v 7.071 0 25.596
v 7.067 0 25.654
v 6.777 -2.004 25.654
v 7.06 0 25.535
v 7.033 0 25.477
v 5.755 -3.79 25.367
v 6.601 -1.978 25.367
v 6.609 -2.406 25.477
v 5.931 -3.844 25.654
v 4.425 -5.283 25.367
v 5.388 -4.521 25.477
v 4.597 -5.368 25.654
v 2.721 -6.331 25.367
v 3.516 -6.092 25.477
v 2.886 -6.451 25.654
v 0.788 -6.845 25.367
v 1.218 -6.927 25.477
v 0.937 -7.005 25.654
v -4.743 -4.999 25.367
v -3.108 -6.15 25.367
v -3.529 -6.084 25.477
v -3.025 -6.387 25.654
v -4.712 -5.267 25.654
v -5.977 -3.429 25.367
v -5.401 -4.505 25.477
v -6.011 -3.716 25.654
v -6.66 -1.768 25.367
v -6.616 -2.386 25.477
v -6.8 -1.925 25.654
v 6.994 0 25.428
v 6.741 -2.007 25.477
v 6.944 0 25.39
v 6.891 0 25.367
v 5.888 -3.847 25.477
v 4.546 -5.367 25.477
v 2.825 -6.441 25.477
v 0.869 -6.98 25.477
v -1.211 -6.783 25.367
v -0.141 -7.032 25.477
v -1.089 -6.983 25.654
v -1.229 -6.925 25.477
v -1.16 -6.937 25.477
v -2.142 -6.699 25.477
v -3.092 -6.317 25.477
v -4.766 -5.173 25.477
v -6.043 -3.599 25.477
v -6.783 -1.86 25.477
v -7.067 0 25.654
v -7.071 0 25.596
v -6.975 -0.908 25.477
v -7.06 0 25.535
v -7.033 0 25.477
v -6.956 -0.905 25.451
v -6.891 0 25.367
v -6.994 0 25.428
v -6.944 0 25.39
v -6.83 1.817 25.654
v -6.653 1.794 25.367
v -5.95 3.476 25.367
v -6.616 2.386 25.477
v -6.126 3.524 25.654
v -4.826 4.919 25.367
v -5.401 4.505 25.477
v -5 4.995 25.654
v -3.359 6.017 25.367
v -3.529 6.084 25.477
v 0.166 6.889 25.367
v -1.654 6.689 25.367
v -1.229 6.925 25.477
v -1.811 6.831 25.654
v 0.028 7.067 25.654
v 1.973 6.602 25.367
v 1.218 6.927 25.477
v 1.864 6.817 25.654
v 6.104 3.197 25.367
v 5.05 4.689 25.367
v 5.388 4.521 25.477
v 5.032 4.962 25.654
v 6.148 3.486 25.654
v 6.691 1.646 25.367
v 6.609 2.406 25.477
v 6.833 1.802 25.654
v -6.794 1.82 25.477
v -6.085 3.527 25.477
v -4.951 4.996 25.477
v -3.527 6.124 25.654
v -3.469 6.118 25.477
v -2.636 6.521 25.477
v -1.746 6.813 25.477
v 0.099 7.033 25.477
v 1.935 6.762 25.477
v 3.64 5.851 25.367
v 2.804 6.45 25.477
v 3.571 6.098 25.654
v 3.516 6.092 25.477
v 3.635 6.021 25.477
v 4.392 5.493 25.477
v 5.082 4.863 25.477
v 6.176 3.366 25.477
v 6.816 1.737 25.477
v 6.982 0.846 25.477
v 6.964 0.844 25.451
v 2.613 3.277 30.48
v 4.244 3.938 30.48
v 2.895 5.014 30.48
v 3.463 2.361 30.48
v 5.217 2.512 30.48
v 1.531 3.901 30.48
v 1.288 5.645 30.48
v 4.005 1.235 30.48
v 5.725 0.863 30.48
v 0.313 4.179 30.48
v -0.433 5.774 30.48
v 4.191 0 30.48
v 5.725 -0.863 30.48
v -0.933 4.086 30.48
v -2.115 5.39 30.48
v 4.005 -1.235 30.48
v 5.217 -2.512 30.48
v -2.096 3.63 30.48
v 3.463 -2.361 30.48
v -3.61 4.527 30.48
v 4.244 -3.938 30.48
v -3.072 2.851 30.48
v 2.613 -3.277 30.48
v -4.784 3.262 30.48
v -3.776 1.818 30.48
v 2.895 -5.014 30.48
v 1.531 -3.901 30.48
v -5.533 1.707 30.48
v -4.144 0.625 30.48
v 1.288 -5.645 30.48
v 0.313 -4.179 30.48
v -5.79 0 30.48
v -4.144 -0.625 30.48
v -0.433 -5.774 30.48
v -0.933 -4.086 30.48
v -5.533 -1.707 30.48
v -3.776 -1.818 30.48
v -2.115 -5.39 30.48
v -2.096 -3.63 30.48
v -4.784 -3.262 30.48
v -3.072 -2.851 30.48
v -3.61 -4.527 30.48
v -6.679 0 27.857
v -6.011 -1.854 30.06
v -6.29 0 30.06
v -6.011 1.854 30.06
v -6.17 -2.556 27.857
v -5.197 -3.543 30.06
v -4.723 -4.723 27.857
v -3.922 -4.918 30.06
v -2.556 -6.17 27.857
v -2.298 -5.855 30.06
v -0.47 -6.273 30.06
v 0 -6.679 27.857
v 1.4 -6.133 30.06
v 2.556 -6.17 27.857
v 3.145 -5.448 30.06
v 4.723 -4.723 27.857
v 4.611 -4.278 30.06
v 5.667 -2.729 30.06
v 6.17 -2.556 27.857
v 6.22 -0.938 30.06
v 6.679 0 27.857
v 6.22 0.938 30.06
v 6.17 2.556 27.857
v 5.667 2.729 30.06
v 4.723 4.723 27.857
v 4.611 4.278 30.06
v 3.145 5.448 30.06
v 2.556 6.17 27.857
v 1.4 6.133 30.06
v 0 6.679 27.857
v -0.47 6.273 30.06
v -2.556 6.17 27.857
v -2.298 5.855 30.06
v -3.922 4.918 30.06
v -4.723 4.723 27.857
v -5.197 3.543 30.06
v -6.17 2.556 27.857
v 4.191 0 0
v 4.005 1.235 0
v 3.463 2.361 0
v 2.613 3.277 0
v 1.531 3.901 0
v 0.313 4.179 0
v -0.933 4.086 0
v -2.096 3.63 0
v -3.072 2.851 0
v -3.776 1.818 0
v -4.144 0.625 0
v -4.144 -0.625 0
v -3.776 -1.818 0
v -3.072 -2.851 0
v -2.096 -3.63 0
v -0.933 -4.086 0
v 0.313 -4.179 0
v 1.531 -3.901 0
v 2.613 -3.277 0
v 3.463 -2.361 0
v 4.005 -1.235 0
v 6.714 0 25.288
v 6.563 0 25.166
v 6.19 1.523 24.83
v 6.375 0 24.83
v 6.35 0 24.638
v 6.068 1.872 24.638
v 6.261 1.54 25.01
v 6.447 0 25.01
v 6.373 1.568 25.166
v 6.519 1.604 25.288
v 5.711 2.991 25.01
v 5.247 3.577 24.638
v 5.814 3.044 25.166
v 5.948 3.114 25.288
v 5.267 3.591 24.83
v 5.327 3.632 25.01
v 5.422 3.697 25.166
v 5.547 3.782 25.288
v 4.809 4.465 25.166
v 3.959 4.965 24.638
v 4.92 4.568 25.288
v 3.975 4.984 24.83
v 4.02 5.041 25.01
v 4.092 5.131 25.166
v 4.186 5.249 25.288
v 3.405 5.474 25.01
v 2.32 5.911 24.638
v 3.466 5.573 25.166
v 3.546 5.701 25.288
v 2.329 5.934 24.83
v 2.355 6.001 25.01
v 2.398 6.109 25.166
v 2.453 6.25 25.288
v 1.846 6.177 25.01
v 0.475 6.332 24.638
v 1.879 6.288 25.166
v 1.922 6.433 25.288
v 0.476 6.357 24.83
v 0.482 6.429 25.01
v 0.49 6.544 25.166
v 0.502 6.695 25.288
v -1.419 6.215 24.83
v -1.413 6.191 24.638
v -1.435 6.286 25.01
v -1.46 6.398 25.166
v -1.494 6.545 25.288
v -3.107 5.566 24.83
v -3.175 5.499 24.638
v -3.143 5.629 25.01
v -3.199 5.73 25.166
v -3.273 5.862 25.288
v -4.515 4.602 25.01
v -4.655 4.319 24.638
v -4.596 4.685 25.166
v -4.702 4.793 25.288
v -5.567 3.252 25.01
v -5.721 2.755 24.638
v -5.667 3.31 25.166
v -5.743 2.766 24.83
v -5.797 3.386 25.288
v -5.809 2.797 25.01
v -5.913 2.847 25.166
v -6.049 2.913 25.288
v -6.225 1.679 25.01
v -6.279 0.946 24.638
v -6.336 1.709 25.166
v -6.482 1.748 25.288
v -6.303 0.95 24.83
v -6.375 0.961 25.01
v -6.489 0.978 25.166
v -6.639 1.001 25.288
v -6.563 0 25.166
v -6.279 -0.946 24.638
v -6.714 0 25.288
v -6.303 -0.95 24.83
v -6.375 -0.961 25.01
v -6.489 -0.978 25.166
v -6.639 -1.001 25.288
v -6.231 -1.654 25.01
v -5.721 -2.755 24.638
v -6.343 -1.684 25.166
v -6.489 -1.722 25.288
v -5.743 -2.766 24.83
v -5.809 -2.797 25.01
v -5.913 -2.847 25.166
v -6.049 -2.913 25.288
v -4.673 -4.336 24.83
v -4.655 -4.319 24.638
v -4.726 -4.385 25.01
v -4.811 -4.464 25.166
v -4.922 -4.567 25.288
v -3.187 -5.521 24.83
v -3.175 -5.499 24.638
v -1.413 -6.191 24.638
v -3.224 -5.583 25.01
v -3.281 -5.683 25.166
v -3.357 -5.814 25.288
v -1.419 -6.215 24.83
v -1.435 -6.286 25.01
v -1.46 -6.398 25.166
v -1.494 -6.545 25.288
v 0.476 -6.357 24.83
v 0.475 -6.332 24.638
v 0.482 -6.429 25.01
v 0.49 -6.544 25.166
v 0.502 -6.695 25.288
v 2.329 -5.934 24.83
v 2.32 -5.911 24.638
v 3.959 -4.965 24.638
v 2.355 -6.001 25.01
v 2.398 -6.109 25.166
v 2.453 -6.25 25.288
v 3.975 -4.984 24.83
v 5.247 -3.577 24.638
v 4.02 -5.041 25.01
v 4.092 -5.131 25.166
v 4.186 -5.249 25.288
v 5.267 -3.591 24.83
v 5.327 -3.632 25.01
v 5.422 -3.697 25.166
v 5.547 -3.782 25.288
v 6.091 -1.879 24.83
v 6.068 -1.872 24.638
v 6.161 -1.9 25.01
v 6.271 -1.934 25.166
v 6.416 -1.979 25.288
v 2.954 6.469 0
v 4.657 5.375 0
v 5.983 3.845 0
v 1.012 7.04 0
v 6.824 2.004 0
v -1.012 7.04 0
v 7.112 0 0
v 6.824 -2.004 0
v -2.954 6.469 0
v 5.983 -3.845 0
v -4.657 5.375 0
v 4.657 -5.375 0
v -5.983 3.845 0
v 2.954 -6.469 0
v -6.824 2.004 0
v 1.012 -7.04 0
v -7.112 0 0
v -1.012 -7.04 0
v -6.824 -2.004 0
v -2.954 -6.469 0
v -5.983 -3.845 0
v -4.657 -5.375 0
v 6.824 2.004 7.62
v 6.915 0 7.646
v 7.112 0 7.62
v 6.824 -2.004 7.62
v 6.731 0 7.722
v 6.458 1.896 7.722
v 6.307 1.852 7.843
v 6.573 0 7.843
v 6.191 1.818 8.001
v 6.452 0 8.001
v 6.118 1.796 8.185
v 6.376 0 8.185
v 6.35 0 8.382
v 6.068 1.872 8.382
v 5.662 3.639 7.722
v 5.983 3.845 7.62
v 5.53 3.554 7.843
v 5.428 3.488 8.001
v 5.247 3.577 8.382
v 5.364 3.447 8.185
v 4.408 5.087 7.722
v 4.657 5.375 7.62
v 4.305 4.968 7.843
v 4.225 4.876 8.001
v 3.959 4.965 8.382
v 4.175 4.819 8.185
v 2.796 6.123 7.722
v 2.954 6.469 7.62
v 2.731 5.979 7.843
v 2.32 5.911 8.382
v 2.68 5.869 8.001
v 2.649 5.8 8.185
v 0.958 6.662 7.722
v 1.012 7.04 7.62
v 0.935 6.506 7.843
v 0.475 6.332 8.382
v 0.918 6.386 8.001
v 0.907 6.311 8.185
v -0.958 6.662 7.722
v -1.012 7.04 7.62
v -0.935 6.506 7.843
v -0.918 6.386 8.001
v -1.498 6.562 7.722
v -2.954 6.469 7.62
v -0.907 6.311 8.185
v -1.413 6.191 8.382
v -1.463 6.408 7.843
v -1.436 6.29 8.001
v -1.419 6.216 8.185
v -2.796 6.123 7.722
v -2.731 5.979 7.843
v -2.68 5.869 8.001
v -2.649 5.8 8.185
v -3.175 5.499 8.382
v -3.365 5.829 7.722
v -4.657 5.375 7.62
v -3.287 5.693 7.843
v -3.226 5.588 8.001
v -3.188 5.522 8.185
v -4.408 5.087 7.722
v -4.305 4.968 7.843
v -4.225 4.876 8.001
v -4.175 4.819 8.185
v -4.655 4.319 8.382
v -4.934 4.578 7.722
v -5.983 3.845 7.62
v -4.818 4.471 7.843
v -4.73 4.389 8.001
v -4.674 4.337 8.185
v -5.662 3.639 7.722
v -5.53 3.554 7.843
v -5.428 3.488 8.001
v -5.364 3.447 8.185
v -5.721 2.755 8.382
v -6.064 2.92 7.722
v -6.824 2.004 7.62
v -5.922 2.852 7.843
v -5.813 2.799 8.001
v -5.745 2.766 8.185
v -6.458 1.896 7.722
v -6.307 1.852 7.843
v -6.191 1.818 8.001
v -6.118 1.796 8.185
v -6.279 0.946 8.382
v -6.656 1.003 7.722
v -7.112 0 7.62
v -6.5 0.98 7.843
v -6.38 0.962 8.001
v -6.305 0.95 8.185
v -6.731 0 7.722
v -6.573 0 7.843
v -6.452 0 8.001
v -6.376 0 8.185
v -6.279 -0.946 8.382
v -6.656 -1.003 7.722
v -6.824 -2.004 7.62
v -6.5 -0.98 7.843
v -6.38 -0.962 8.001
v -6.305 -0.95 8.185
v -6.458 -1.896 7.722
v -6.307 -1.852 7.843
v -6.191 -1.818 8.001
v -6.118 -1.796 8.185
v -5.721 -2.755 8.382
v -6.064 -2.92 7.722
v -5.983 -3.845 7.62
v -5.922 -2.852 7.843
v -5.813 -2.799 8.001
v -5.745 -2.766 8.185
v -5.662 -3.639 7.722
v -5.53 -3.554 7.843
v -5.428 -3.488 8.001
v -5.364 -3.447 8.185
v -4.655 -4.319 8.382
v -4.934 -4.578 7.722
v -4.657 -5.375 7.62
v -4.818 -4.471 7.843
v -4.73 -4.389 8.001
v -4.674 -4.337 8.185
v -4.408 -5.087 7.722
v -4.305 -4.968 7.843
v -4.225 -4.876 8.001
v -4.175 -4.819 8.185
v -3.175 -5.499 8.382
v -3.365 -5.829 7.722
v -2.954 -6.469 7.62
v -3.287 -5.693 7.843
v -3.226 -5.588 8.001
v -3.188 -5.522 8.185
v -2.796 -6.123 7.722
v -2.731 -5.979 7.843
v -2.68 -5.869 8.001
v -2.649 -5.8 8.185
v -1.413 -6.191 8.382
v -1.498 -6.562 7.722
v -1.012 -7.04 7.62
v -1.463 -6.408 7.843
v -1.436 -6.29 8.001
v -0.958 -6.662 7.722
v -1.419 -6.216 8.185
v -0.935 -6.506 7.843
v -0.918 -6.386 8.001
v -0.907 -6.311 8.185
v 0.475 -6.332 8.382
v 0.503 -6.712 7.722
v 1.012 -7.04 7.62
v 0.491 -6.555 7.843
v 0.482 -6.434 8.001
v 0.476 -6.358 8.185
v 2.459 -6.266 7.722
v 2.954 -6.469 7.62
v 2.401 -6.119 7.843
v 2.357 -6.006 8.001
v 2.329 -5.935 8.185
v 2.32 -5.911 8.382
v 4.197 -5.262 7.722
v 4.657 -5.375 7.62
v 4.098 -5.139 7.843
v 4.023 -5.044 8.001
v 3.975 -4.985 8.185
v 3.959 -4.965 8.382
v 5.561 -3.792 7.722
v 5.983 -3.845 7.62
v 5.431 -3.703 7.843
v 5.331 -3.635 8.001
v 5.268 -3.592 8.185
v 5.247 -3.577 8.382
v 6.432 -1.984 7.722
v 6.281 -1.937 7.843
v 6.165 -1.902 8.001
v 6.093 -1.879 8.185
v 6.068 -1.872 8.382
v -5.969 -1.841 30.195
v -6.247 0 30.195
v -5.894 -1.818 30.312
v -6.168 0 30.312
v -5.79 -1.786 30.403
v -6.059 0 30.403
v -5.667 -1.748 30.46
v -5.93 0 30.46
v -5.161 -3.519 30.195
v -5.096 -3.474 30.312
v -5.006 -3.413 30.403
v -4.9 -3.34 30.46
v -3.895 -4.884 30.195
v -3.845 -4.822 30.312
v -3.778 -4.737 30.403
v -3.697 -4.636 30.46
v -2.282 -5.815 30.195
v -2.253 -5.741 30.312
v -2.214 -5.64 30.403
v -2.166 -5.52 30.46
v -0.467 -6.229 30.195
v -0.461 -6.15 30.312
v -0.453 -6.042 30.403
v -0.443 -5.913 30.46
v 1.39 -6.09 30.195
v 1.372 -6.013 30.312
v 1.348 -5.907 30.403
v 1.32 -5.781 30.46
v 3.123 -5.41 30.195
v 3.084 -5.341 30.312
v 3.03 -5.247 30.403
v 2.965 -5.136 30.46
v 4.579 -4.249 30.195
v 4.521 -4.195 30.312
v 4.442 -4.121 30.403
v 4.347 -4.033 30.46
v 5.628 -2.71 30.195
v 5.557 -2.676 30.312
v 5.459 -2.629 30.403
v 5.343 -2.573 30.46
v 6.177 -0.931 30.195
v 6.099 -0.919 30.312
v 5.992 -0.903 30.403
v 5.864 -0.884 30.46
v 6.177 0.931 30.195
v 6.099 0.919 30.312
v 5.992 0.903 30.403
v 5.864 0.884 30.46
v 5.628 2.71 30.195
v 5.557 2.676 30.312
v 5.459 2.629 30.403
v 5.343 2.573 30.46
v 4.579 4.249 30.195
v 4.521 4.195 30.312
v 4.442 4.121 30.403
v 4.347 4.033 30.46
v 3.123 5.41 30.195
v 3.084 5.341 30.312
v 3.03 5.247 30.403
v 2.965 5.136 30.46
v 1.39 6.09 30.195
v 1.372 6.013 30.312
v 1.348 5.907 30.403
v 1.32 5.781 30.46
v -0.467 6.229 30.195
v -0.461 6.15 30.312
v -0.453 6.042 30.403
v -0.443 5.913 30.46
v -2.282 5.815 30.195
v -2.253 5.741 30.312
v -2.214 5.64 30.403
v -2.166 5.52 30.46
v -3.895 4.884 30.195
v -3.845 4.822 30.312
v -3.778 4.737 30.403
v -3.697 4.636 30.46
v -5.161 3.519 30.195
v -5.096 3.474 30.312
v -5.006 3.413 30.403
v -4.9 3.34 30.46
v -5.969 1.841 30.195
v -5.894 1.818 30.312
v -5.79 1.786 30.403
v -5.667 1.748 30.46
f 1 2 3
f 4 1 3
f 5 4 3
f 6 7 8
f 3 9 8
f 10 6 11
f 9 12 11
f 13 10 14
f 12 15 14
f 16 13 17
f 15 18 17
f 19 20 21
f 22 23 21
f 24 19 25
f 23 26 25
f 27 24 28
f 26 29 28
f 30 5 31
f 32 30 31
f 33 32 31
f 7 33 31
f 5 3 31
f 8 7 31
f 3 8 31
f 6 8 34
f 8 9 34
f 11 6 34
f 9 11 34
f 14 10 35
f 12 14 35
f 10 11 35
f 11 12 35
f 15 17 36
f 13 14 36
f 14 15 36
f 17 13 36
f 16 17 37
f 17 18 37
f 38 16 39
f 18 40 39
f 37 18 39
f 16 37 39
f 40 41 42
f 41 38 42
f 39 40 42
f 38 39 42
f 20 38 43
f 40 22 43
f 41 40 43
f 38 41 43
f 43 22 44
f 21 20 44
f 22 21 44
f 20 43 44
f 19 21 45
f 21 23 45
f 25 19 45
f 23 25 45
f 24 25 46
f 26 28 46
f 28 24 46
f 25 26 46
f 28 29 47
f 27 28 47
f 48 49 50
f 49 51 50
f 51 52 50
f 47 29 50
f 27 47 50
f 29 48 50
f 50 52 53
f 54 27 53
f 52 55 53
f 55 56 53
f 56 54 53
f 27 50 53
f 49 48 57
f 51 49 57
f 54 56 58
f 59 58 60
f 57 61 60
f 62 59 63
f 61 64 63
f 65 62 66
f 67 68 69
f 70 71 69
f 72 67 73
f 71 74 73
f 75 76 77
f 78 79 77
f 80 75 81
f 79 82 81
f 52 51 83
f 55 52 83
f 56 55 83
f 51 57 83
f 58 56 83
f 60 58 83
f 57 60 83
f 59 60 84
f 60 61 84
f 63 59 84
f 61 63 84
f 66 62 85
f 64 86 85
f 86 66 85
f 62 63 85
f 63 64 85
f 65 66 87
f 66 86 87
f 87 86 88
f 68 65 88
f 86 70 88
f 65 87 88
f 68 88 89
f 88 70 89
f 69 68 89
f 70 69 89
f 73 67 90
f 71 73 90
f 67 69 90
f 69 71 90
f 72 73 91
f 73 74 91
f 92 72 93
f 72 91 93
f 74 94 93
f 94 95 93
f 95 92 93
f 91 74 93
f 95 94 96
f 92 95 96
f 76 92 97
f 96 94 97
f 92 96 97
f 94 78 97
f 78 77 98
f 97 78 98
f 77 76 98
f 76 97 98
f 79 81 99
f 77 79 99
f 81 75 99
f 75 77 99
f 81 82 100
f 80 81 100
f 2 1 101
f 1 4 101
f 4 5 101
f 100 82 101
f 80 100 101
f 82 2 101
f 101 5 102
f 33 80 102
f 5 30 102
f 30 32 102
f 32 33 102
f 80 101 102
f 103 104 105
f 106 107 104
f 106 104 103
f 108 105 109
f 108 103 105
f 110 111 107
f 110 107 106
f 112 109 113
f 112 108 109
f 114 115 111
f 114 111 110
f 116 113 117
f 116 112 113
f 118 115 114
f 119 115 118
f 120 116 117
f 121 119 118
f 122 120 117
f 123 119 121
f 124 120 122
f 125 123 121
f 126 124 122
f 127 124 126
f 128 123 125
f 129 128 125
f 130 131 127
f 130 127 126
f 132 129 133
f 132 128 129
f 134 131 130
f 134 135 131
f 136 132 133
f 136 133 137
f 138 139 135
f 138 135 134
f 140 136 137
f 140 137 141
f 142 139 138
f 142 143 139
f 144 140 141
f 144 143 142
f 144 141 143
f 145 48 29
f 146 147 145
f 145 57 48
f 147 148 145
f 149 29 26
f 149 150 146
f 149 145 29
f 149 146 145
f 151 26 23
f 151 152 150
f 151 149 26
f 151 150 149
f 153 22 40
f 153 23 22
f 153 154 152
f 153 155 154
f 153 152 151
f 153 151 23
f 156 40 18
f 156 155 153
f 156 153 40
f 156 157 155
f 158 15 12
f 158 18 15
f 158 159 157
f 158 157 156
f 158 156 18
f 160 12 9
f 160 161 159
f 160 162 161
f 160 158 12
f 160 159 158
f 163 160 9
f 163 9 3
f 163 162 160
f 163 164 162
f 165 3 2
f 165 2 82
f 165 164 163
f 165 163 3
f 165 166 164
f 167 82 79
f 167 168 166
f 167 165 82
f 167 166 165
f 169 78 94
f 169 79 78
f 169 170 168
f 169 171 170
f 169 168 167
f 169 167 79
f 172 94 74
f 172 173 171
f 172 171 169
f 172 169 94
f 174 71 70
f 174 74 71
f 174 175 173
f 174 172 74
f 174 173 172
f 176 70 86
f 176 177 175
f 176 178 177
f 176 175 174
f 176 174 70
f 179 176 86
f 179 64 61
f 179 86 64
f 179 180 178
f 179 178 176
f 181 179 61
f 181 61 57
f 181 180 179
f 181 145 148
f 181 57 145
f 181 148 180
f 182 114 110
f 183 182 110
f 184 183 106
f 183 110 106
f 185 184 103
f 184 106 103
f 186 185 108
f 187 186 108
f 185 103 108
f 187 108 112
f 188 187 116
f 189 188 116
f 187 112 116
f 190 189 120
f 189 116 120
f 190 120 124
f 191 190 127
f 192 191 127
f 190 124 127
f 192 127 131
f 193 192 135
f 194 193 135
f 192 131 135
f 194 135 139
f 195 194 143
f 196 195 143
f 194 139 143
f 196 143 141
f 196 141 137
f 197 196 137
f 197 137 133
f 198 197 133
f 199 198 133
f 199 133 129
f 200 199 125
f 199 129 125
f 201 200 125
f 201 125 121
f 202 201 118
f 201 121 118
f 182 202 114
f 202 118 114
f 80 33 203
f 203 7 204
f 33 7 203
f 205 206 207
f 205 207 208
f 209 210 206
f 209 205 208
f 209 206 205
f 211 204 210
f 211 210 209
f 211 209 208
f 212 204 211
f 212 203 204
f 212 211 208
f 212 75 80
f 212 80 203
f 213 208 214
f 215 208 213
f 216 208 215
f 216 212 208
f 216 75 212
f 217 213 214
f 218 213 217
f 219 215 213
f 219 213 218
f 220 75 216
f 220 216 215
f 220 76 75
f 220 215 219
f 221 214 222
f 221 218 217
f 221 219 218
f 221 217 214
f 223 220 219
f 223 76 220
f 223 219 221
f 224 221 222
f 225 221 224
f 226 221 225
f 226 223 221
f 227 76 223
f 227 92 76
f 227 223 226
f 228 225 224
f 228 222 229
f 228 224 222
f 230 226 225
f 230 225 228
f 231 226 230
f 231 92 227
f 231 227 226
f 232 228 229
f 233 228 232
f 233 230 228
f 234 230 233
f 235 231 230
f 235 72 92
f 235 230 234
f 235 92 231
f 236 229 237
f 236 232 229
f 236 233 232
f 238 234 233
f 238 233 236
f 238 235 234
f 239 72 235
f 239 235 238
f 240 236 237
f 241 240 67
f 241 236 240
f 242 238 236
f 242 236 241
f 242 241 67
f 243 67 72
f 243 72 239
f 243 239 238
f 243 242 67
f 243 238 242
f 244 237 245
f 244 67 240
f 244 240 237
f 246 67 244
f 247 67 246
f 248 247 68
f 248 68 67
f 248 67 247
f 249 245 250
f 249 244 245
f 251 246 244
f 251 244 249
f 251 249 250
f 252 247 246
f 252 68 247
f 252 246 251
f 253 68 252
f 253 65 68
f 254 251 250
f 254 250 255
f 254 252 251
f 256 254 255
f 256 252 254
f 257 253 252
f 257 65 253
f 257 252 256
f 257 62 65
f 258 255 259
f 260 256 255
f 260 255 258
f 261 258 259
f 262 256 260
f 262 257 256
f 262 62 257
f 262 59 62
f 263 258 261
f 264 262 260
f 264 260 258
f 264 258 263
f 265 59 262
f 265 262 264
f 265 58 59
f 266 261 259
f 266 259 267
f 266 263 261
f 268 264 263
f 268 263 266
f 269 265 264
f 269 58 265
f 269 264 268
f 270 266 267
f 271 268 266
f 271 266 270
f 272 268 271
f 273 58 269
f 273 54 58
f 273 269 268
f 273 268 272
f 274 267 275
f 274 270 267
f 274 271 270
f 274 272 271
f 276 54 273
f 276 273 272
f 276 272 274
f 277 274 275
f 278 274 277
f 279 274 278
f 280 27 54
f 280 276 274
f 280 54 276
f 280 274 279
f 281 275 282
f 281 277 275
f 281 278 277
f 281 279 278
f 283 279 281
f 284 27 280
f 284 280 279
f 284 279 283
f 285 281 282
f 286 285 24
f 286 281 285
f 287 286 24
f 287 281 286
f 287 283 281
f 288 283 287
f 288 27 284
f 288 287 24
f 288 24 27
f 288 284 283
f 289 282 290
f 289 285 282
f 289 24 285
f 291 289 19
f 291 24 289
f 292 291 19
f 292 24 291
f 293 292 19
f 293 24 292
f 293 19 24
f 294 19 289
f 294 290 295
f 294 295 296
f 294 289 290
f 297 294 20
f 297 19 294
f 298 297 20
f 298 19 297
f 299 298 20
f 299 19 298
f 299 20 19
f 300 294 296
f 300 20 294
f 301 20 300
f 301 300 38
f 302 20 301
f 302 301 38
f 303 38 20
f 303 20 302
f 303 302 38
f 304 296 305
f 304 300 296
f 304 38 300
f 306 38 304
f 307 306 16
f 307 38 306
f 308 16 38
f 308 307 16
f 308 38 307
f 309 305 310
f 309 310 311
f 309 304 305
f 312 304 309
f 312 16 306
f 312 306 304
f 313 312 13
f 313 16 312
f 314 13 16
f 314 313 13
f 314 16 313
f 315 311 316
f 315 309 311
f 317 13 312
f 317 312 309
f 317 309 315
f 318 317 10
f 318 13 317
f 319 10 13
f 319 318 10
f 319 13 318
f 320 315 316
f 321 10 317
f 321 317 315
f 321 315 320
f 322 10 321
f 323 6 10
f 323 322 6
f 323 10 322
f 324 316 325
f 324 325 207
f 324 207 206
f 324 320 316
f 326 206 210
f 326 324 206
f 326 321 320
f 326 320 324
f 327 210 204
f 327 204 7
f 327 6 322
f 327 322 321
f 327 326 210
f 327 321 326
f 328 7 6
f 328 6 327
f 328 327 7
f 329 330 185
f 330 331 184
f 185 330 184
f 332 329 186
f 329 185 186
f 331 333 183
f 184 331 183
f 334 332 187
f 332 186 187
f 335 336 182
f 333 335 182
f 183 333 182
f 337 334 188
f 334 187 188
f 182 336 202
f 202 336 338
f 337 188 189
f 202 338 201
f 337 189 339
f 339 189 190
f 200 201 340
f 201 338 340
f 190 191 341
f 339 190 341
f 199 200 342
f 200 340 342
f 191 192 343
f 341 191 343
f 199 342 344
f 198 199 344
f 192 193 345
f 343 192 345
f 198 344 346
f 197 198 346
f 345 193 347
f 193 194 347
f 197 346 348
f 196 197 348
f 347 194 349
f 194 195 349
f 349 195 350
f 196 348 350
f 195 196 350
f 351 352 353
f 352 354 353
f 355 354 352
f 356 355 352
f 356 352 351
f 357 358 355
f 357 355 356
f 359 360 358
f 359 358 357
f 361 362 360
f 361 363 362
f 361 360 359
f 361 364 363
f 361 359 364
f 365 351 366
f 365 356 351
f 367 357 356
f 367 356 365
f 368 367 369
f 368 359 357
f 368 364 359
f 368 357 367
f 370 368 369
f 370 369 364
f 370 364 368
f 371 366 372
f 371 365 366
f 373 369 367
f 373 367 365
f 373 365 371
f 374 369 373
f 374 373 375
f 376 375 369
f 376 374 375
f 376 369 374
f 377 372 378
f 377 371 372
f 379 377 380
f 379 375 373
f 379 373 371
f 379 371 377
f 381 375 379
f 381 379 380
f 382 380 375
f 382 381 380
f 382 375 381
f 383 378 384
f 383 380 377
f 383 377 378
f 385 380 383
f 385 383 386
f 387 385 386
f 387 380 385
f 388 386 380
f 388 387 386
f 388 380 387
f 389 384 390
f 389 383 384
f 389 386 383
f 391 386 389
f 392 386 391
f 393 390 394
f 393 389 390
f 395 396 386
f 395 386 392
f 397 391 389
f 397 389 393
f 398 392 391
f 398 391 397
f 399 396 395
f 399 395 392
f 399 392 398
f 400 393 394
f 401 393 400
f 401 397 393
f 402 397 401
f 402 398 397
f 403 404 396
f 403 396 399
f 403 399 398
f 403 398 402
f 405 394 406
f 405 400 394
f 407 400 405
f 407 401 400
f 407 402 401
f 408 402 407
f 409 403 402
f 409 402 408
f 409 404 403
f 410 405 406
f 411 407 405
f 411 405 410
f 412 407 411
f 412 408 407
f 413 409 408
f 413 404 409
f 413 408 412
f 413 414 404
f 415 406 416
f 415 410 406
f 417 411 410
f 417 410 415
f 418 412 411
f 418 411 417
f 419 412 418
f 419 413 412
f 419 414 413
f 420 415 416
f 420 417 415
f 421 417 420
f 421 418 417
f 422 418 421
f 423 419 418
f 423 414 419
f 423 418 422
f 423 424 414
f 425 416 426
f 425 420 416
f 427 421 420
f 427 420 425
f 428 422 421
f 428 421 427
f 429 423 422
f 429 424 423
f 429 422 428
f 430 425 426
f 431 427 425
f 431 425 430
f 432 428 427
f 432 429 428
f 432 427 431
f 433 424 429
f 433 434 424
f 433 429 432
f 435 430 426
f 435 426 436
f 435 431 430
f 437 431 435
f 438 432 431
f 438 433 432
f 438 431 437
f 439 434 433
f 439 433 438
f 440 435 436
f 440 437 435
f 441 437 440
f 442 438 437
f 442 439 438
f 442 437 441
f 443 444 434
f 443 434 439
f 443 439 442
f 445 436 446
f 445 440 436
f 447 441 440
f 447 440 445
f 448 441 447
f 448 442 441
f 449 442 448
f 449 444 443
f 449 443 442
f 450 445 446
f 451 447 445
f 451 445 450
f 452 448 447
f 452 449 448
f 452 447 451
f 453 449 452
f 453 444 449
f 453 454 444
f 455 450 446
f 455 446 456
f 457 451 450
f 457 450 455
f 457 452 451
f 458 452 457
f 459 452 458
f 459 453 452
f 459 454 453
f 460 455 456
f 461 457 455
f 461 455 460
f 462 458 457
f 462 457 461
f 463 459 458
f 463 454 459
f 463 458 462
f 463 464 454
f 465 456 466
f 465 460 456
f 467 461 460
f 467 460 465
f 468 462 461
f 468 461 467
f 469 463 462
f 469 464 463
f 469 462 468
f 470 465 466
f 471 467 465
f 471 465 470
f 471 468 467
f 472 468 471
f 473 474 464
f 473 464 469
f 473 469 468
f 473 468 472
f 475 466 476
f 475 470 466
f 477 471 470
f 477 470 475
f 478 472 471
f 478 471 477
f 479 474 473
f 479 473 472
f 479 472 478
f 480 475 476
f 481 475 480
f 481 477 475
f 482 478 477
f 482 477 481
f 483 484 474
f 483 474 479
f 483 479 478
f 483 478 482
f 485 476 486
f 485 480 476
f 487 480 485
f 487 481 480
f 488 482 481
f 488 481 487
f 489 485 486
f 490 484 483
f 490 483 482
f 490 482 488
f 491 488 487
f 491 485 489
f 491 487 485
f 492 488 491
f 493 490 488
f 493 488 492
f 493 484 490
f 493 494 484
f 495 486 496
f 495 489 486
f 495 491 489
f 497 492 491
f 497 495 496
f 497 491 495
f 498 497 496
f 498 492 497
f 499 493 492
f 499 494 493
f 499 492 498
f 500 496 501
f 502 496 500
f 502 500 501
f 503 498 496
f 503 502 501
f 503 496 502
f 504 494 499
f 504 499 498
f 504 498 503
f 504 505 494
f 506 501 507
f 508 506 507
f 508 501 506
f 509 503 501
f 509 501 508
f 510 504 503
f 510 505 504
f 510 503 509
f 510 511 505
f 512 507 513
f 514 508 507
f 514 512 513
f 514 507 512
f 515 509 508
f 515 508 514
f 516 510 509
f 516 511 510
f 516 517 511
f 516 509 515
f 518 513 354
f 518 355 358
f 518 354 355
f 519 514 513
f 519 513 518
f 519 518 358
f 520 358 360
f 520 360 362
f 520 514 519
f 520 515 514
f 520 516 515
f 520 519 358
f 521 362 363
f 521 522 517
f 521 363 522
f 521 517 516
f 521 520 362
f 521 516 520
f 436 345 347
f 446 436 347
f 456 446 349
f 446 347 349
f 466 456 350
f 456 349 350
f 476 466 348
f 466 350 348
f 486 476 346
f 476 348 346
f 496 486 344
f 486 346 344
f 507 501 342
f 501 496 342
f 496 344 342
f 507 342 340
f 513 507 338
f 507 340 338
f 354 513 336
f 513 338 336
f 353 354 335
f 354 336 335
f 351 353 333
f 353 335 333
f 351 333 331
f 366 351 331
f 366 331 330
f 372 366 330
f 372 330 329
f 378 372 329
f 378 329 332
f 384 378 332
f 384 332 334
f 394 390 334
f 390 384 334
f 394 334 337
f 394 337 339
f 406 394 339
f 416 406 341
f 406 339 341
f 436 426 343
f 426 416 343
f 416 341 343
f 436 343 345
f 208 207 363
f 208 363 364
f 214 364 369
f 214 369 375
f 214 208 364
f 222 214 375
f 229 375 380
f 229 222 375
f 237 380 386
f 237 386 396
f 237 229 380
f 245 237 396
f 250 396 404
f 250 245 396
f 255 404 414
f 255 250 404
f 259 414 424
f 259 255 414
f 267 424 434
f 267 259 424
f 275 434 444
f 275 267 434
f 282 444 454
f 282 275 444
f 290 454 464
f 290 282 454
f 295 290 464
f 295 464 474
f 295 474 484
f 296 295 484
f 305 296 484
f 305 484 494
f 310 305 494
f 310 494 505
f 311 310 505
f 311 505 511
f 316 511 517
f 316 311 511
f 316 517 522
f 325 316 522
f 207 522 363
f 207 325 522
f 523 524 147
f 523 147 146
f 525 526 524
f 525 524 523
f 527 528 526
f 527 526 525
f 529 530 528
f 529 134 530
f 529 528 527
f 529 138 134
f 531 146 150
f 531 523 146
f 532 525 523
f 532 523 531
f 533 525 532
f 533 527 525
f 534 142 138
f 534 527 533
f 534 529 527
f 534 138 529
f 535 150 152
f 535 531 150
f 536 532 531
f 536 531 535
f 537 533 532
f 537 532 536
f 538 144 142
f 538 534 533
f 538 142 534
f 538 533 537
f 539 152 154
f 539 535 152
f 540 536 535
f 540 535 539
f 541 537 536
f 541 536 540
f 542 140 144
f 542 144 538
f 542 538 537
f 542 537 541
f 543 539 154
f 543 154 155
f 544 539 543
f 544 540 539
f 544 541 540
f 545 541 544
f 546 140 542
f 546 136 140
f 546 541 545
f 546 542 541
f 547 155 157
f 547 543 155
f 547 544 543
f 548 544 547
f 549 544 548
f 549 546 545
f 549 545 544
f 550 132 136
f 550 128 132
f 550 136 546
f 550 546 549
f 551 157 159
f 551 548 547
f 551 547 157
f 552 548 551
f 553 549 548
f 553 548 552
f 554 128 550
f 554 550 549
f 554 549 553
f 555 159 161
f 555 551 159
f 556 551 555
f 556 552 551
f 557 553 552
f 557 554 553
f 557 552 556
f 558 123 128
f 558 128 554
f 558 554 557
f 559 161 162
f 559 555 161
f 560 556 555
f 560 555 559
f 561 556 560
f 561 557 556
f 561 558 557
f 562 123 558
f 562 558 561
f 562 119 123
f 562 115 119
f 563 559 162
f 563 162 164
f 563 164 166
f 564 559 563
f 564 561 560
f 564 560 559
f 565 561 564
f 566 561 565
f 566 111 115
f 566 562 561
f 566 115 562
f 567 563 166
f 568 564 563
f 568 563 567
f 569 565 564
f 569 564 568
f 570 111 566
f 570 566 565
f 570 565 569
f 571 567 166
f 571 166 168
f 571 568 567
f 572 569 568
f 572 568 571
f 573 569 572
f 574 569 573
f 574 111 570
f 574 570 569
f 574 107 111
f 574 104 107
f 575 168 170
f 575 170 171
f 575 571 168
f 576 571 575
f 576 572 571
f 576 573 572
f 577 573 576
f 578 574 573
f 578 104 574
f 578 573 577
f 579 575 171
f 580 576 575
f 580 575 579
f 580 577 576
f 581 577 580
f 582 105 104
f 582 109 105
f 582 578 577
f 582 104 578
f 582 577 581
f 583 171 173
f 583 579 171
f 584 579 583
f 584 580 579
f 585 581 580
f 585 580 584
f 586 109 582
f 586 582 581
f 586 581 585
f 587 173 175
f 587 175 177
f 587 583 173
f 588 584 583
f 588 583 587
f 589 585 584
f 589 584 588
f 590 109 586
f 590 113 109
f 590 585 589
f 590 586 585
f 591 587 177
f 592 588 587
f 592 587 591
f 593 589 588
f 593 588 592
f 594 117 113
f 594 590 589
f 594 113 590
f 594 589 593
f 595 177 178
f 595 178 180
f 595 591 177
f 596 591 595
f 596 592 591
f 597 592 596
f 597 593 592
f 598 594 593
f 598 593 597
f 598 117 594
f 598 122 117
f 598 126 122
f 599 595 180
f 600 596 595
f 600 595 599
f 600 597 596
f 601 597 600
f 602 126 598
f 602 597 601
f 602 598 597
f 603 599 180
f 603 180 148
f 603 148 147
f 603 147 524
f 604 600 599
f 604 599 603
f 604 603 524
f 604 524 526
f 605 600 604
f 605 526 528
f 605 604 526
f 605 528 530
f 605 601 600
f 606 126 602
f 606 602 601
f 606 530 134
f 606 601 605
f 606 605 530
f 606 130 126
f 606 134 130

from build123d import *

# Parameters (mm, degrees)
SKETCH1_R           = 7.112
BOSS_EXTRUDE1_DEPTH = 30.48
SKETCH2_R           = 4.191
CUT_EXTRUDE1_DEPTH  = 30.48
CUT_EXTRUDE2_START  = -5.08
SKETCH3_R           = 7.874
SKETCH3_R_2         = 6.35
CUT_EXTRUDE2_DEPTH  = 17.78
FILLET1_R           = 0.762
FILLET2_R           = 0.762
CHAMFER1_SIZE       = 5.08
CHAMFER1_SIZE_2     = 0.895741062
FILLET3_R           = 0.508
FILLET4_R           = 0.254


# Some blends are built 0.0001 mm under size
with BuildPart() as part:
    # Sketch1 → Boss-Extrude1 (new body)
    with BuildSketch(Plane.XY):
        with Locations(Location((0, 0, 0), (0, 0, 180))):
            Circle(SKETCH1_R)
    extrude(amount=BOSS_EXTRUDE1_DEPTH)

    # Sketch2 → Cut-Extrude1 (cut)
    with BuildSketch(Plane.XY.offset(30.48)):
        Circle(SKETCH2_R)
    extrude(amount=-CUT_EXTRUDE1_DEPTH, mode=Mode.SUBTRACT)

    # Sketch3 → Cut-Extrude2 (cut)
    with BuildSketch(Plane.XY.offset(30.48).offset(CUT_EXTRUDE2_START)):
        Circle(SKETCH3_R)
        Circle(SKETCH3_R_2, mode=Mode.SUBTRACT)
    extrude(amount=-CUT_EXTRUDE2_DEPTH, mode=Mode.SUBTRACT)

    # Fillet1
    fillet1_edges = [part.edges().sort_by_distance(p)[0] for p in [
        (-6.35, 0, 7.62),
    ]]
    fillet(fillet1_edges, radius=FILLET1_R - 0.0001)  # a hair under: the kernel refuses the full size

    # Fillet2
    fillet2_edges = [part.edges().sort_by_distance(p)[0] for p in [
        (-6.35, 0, 25.4),
    ]]
    fillet(fillet2_edges, radius=FILLET2_R - 0.0001)  # a hair under: the kernel refuses the full size

    # Chamfer1
    # the kernel refuses this chamfer: 5.08, 0.895741062 mm, written as the material it takes off along each edge
    with BuildSketch(Plane(origin=(0, 0, 30.48), x_dir=(-1, 0, 0), z_dir=(0, 1, 0))) as chamfer1_piece_1:
        Polygon((7.112, -CHAMFER1_SIZE), (7.112 - CHAMFER1_SIZE_2, 0), (7.112, 0), align=None)
    revolve(axis=Axis((0, 0, 30.48), (0, 0, 1)), mode=Mode.SUBTRACT)

    # Fillet3
    fillet3_edges = [part.edges().sort_by_distance(p)[0] for p in [
        (6.216258938, 0, 30.48),
    ]]
    fillet(fillet3_edges, radius=FILLET3_R)

    # Fillet4
    fillet4_edges = [part.edges().sort_by_distance(p)[0] for p in [
        (7.112, 0, 25.4),
    ]]
    fillet(fillet4_edges, radius=FILLET4_R)


solid = part.part
